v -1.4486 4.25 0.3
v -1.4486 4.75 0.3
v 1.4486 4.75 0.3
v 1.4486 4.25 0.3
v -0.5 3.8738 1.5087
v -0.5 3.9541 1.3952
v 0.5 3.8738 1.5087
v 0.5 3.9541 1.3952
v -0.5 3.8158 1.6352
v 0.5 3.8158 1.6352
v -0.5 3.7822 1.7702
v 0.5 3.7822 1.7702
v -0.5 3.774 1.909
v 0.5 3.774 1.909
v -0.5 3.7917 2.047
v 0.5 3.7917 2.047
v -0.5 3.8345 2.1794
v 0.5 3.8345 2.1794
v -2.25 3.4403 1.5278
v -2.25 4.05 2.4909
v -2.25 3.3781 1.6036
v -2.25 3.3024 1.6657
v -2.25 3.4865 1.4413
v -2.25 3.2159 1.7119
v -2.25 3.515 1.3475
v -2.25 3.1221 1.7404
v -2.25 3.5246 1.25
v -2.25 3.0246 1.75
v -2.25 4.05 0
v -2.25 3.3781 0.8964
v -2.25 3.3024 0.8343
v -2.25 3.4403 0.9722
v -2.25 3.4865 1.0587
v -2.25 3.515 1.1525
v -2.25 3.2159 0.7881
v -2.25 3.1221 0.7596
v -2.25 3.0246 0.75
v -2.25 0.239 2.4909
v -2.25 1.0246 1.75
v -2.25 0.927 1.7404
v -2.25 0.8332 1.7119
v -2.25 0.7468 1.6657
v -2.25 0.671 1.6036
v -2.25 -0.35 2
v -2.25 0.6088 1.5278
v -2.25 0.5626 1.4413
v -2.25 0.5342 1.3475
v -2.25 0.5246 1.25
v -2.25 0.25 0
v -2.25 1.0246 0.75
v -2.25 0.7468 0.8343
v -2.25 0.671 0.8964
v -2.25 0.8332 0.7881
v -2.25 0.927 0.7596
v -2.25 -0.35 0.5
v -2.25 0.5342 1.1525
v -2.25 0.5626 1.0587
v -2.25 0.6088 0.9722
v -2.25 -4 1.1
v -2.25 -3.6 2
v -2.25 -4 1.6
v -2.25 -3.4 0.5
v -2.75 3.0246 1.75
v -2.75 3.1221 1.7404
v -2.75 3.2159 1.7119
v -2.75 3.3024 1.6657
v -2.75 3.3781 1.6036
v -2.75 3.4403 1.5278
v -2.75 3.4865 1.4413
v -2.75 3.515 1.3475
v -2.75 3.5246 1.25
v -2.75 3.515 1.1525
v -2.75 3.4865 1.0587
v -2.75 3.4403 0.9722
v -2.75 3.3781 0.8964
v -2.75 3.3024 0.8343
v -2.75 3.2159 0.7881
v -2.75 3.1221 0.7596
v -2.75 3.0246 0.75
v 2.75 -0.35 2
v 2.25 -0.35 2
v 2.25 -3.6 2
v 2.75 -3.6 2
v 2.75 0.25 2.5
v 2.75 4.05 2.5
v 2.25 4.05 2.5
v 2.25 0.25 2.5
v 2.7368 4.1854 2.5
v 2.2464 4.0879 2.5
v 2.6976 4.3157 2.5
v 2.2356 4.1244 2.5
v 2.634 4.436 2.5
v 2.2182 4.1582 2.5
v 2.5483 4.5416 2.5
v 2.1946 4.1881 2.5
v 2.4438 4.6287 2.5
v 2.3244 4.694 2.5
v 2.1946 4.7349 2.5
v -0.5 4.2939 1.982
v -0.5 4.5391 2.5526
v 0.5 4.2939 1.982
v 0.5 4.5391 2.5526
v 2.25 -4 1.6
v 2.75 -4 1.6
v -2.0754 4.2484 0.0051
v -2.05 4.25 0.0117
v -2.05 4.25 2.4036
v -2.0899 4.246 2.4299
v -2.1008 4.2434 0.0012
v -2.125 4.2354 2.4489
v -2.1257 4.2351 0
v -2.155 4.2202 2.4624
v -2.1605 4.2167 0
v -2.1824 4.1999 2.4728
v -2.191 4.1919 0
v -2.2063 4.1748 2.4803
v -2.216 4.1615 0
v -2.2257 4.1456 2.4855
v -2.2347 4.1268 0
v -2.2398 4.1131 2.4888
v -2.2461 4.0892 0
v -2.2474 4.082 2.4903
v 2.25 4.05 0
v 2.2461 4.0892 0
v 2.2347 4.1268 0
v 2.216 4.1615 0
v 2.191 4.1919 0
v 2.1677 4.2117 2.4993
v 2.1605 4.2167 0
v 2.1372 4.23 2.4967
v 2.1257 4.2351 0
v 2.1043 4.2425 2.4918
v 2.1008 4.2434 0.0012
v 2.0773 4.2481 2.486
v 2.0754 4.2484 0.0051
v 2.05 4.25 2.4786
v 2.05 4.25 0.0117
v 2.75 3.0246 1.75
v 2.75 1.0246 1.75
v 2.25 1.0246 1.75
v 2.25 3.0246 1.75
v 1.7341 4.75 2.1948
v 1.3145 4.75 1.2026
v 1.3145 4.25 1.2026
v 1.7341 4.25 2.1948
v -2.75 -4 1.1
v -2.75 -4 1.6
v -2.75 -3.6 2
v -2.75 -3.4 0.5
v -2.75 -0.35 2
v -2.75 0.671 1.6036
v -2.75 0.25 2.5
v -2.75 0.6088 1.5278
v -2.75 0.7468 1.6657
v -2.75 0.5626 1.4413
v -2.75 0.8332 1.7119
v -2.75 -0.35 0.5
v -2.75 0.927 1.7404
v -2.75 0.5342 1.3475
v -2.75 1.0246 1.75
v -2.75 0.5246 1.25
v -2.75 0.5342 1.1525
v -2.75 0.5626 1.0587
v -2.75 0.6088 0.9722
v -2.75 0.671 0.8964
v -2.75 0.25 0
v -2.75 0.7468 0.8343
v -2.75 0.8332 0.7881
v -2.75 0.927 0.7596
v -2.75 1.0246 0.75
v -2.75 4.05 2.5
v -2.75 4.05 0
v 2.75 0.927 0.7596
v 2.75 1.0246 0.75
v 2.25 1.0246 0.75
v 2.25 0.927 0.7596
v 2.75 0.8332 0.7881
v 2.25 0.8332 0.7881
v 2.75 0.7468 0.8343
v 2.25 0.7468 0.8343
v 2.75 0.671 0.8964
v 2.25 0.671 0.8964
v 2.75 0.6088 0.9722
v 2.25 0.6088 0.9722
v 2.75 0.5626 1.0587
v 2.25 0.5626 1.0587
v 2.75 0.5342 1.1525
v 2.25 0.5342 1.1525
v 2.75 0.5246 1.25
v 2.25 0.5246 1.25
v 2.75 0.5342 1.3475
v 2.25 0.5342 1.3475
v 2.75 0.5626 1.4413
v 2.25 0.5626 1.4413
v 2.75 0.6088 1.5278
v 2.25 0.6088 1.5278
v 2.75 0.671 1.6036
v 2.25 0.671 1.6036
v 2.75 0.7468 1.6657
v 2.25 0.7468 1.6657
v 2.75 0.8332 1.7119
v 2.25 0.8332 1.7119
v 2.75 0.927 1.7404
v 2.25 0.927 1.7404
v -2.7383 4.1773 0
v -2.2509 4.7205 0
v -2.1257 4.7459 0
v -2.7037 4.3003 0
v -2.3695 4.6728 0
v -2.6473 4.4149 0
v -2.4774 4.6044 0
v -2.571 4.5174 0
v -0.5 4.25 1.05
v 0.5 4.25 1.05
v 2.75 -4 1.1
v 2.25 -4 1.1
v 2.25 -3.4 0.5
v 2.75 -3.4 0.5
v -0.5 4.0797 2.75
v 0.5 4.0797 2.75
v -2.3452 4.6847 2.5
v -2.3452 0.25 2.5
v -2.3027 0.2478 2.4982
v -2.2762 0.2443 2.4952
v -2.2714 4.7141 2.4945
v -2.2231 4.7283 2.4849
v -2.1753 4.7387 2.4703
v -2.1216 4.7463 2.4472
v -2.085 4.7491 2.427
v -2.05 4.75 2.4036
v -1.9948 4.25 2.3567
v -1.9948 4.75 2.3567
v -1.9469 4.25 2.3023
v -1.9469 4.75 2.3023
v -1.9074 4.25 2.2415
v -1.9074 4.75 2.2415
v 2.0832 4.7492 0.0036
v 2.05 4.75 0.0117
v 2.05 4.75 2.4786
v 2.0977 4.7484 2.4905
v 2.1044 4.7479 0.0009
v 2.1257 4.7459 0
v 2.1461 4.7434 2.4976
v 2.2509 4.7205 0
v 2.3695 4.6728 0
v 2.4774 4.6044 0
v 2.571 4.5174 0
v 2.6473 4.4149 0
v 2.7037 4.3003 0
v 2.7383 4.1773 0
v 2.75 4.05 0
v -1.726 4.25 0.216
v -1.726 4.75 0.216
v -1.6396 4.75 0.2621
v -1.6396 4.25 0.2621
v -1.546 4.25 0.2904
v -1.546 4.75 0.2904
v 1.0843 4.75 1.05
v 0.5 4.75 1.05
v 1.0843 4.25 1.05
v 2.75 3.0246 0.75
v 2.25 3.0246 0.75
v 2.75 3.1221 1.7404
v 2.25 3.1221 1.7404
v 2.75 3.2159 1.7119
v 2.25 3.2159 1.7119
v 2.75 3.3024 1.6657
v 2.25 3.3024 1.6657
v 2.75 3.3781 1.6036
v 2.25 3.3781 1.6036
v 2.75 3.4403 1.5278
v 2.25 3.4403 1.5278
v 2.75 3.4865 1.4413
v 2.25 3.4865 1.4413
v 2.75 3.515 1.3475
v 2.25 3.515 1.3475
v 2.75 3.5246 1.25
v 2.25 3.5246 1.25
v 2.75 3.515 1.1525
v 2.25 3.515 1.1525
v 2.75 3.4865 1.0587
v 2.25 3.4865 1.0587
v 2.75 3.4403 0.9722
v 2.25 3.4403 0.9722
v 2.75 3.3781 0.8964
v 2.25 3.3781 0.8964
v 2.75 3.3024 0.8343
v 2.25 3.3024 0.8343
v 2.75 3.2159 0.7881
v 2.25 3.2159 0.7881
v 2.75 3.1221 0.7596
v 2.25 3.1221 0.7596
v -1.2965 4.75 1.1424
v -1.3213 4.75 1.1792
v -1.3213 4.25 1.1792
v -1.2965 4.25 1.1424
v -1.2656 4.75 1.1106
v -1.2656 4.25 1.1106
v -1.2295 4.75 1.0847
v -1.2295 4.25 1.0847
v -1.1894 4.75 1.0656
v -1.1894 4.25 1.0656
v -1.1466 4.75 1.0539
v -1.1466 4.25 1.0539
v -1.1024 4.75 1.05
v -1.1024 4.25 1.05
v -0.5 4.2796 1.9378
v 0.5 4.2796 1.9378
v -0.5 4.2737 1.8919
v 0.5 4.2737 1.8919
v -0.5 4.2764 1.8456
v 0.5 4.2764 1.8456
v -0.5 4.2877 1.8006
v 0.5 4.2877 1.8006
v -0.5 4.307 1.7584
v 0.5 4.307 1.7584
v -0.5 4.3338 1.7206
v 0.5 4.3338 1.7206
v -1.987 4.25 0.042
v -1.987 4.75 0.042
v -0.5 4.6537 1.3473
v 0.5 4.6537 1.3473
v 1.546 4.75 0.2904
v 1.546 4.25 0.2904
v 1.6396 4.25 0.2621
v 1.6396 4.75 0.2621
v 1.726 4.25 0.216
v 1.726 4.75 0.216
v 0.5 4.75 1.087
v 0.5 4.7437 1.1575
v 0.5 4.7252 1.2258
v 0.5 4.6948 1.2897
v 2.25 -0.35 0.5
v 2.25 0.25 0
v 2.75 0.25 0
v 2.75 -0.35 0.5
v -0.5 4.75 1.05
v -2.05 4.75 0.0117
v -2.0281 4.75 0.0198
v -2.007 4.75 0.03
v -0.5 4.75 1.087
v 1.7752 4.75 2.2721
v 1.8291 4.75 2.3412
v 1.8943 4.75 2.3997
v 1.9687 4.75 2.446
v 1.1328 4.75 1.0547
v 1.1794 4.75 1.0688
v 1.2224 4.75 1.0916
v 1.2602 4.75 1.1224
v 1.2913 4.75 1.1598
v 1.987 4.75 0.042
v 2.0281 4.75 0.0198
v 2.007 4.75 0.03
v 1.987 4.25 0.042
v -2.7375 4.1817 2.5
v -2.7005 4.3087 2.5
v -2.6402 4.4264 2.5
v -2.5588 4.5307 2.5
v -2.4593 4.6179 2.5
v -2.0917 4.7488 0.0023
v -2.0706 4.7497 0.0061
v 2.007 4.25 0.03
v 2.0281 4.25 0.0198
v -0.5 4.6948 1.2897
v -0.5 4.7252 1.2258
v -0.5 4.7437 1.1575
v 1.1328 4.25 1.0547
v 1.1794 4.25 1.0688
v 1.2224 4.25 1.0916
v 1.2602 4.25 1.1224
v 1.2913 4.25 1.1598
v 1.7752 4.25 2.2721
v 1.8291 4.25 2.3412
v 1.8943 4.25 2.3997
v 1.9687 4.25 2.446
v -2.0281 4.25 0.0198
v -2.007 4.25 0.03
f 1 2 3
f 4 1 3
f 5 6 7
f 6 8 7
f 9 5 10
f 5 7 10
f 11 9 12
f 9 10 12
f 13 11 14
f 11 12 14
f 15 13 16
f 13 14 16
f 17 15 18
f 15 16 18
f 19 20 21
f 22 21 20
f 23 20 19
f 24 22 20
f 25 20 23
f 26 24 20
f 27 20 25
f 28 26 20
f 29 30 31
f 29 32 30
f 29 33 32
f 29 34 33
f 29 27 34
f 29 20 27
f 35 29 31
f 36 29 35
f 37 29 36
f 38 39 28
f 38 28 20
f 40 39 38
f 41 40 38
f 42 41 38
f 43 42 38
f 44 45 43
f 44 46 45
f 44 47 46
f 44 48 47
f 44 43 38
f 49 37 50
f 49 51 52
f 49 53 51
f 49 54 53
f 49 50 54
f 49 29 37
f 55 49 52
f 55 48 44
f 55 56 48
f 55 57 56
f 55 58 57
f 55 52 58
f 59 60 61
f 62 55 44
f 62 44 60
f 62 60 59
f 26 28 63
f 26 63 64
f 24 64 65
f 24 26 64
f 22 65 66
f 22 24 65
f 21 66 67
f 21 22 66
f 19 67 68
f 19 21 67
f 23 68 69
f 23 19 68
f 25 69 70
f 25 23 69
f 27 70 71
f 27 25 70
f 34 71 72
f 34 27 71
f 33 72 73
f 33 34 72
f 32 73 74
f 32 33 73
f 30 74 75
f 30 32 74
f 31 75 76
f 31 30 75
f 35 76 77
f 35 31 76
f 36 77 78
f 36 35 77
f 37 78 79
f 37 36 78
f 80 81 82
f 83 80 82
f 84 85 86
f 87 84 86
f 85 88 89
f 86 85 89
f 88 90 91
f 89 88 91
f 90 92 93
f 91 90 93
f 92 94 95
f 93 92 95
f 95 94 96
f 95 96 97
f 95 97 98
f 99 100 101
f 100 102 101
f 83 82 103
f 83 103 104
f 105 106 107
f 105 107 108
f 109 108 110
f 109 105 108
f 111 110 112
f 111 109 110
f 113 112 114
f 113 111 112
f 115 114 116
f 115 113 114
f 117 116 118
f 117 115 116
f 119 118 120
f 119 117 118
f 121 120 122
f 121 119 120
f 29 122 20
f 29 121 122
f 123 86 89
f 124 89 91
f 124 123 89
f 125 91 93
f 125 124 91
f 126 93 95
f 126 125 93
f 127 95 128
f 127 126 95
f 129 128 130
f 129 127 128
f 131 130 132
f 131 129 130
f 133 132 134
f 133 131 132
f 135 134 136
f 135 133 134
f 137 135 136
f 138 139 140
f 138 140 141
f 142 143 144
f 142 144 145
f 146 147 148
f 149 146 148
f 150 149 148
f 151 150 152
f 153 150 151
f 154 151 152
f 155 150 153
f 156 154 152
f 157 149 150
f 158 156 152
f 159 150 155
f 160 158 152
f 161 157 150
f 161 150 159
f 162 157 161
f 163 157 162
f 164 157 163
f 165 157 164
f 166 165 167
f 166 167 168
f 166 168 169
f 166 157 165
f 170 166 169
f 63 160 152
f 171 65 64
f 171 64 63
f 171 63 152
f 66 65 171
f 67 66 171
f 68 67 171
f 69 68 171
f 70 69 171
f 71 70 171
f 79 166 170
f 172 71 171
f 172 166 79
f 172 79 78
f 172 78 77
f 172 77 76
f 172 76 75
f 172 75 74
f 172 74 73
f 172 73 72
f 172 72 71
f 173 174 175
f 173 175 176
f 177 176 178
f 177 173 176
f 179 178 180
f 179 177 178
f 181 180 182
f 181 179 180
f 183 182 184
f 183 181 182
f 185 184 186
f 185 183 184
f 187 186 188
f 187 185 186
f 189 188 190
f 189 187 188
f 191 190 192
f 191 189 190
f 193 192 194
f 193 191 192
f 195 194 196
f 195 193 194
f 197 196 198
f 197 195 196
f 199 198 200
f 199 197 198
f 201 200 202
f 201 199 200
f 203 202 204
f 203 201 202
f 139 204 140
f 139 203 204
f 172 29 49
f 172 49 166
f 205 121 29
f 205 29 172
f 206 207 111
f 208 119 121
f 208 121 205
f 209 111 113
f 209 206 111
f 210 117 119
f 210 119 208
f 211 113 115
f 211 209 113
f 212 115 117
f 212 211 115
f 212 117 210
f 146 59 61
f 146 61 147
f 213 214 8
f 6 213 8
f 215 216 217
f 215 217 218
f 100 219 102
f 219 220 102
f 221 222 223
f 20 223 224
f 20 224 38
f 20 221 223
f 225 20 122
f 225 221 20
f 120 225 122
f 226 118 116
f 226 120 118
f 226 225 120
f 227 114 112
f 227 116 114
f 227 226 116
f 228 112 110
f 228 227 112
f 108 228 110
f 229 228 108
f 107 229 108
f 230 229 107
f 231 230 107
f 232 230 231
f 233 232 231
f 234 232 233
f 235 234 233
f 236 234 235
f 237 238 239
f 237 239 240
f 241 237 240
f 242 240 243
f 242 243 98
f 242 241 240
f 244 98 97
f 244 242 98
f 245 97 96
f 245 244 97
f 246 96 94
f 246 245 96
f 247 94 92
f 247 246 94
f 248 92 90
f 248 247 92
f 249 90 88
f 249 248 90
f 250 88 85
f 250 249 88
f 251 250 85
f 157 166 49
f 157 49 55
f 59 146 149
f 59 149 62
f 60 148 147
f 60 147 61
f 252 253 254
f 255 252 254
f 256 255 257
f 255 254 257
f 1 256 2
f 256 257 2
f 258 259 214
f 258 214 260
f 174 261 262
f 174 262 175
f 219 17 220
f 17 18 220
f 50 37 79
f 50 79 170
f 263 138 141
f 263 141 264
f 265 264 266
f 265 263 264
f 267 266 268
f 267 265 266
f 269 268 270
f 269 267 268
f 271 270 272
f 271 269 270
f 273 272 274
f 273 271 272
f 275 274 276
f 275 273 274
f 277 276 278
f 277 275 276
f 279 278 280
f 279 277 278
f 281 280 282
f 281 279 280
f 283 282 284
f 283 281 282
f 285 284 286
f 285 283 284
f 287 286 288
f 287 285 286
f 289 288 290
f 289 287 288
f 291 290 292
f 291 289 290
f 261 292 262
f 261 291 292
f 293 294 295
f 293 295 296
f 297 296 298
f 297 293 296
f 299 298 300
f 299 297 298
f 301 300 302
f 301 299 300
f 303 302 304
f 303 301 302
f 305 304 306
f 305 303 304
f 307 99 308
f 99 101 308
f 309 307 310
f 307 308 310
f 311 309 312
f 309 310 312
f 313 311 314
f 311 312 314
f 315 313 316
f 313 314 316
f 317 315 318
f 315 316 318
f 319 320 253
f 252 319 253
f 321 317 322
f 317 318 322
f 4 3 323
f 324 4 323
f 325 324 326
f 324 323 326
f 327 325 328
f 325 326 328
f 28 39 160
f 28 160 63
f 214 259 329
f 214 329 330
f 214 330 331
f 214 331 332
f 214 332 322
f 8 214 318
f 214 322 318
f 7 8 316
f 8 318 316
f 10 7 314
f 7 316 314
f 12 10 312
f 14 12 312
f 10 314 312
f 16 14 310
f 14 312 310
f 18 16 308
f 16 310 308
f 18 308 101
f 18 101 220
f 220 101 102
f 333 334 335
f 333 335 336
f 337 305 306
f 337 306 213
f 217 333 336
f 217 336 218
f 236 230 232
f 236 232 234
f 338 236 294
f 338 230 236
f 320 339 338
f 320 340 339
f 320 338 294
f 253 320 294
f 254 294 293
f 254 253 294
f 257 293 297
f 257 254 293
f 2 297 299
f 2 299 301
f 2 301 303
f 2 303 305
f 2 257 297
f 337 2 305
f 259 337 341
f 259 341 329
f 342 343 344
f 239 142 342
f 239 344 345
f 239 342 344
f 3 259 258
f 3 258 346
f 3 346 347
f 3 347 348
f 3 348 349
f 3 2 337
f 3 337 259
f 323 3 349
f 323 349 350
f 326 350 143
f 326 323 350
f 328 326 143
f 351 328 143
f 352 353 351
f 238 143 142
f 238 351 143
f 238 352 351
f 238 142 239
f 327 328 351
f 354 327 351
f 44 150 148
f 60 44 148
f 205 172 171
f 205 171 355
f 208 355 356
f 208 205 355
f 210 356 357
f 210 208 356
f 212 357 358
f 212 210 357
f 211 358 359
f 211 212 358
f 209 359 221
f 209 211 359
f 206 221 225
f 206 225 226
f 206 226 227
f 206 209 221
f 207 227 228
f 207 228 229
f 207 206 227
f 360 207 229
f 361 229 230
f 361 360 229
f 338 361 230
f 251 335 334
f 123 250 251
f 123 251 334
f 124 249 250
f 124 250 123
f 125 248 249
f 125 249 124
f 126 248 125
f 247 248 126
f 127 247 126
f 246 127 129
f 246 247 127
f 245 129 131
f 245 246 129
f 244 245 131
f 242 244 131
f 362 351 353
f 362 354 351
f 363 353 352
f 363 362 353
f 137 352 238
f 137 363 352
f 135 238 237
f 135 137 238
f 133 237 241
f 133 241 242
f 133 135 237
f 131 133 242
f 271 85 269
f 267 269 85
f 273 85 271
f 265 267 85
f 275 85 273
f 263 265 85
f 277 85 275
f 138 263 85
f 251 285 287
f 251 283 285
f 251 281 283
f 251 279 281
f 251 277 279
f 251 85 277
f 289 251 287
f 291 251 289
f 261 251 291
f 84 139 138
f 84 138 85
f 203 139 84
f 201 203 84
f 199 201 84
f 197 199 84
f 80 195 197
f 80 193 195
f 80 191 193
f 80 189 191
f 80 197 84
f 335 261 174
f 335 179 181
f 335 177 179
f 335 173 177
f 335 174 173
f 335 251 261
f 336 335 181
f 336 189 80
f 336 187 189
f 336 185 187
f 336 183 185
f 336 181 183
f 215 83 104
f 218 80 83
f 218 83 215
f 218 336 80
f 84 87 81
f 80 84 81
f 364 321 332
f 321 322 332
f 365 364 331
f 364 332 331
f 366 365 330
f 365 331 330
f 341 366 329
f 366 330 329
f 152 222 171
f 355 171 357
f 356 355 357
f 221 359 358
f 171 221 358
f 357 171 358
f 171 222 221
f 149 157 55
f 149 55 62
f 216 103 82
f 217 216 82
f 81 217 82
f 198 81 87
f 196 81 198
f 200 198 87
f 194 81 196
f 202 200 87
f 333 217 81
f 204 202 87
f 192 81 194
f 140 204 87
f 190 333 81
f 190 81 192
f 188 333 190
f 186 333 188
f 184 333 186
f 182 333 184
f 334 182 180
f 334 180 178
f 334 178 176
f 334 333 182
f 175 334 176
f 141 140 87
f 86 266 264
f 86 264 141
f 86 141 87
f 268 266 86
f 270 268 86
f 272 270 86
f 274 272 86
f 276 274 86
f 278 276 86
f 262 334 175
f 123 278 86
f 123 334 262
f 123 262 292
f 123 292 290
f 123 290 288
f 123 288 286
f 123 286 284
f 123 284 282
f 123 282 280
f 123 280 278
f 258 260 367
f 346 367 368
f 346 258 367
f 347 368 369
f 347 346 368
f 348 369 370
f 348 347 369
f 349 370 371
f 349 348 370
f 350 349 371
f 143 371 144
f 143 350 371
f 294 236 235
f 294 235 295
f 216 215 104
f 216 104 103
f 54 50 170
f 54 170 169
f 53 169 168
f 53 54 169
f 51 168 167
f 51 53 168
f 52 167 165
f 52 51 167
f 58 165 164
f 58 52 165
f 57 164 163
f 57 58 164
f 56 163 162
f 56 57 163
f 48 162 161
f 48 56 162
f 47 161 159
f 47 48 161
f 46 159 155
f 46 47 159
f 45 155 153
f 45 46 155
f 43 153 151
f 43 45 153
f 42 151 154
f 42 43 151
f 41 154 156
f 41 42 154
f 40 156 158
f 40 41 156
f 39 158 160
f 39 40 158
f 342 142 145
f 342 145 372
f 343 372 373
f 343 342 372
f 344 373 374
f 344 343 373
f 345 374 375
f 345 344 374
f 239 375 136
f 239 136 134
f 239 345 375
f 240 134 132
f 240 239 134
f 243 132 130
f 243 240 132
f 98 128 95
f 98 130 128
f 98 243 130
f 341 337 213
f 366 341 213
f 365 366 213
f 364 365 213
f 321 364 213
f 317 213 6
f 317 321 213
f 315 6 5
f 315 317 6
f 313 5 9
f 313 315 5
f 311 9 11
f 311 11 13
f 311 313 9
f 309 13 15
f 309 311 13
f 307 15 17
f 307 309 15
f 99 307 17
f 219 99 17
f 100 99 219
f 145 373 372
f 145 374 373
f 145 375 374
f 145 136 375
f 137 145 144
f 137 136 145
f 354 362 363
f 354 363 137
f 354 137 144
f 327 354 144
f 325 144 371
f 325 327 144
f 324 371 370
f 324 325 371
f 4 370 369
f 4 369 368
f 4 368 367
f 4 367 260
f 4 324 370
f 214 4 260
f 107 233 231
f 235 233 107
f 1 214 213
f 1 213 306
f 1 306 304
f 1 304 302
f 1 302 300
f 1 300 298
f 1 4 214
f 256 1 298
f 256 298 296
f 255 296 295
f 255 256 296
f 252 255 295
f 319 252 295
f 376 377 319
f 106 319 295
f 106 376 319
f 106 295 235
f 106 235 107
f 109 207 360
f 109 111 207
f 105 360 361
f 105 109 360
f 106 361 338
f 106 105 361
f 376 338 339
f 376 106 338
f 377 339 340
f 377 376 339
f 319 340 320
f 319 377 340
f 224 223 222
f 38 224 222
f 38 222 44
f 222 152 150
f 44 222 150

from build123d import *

# Parameters (mm, degrees)
BOSS_EXTRUDE1_DEPTH = 2.5
CUT_EXTRUDE1_DEPTH  = 10.5
FILLET1_R           = 0.25
CUT_EXTRUDE2_DEPTH  = 5.25
BOSS_EXTRUDE2_DEPTH = 0.5
CHAMFER1_SIZE       = 0.6
CHAMFER2_SIZE       = 0.4


with BuildPart() as part:
    # Sketch1 → Boss-Extrude1 (new body)
    with BuildSketch(Plane.XY):
        with BuildLine():
            Line((-2.75, -4), (-2.75, 4.05))
            ThreePointArc((-2.75, 4.05), (-2.544974747, 4.544974747), (-2.05, 4.75))
            Line((-2.05, 4.75), (2.05, 4.75))
            ThreePointArc((2.05, 4.75), (2.544974747, 4.544974747), (2.75, 4.05))
            Line((2.75, 4.05), (2.75, -4))
            Line((2.75, -4), (2.25, -4))
            Line((2.25, -4), (2.25, 4.05))
            ThreePointArc((2.25, 4.05), (2.191421356, 4.191421356), (2.05, 4.25))
            Line((2.05, 4.25), (-2.05, 4.25))
            ThreePointArc((-2.05, 4.25), (-2.191421356, 4.191421356), (-2.25, 4.05))
            Line((-2.25, 4.05), (-2.25, -4))
            Line((-2.25, -4), (-2.75, -4))
        make_face()
    extrude(amount=BOSS_EXTRUDE1_DEPTH)

    # Sketch2 → Cut-Extrude1 (cut)
    with BuildSketch(Plane(origin=(0, 4.75, 0), x_dir=(1, 0, 0), z_dir=(0, 1, 0))):
        with BuildLine():
            Line((-2.05, 0), (-1.725962279, -0.216025147))
            ThreePointArc((-1.725962279, -0.216025147), (-1.593504255, -0.278546013), (-1.448612181, -0.3))
            Line((-1.448612181, -0.3), (1.448612181, -0.3))
            ThreePointArc((1.448612181, -0.3), (1.593504255, -0.278546013), (1.725962279, -0.216025147))
            Line((1.725962279, -0.216025147), (2.05, 0))
            Line((2.05, 0), (2.05, 0.547519398))
            Line((2.05, 0.547519398), (-2.05, 0.547519398))
            Line((-2.05, 0.547519398), (-2.05, 0))
        make_face()
        with BuildLine():
            Line((-2.75, -2.5), (-2.345189488, -2.5))
            ThreePointArc((-2.345189488, -2.5), (-2.090994028, -2.430563198), (-1.907400646, -2.241538671))
            Line((-1.907400646, -2.241538671), (-1.321299677, -1.179230664))
            ThreePointArc((-1.321299677, -1.179230664), (-1.229502986, -1.084718401), (-1.102405256, -1.05))
            Line((-1.102405256, -1.05), (1.084290526, -1.05))
            ThreePointArc((1.084290526, -1.05), (1.222412736, -1.091619926), (1.314545856, -1.202621958))
            Line((1.314545856, -1.202621958), (1.734132573, -2.194756083))
            ThreePointArc((1.734132573, -2.194756083), (1.918398814, -2.416760148), (2.194643233, -2.5))
            Line((2.194643233, -2.5), (2.75, -2.5))
            Line((2.75, -2.5), (2.75, -3.056093585))
            Line((2.75, -3.056093585), (-2.75, -3.056093585))
            Line((-2.75, -3.056093585), (-2.75, -2.5))
        make_face()
    extrude(amount=-CUT_EXTRUDE1_DEPTH, mode=Mode.SUBTRACT)

    # Fillet1
    fillet1_edges = [part.edges().sort_by_distance(p)[0] for p in [
        (-2.05, 4.5, 0),
        (2.05, 4.5, 0),
    ]]
    fillet(fillet1_edges, radius=FILLET1_R)

    # Sketch3 → Cut-Extrude2 (cut, symmetric)
    with BuildSketch(Plane(origin=(0, 0, 0), x_dir=(0, 0, -1), z_dir=(1, 0, 0))):
        Polygon((0, 0.25), (-0.5, -0.35), (-0.5, -4.396314828), (0.876390697, -4.396314828), (0.876390697, 0.25), align=None)
        Polygon((-2.5, 0.25), (-2, -0.35), (-2, -4.896314828), (-3.070294312, -4.896314828), (-3.070294312, 0.25), align=None)
        with BuildLine():
            Line((-0.75, 3.024565065), (-0.75, 1.024565065))
            ThreePointArc((-0.75, 1.024565065), (-1.25, 0.524565065), (-1.75, 1.024565065))
            Line((-1.75, 1.024565065), (-1.75, 3.024565065))
            ThreePointArc((-1.75, 3.024565065), (-1.25, 3.524565065), (-0.75, 3.024565065))
        make_face()
    extrude(amount=CUT_EXTRUDE2_DEPTH, both=True, mode=Mode.SUBTRACT)

    # Sketch4 → Boss-Extrude2 (add, symmetric)
    with BuildSketch(Plane(origin=(0, 0, 0), x_dir=(0, 0, -1), z_dir=(1, 0, 0))):
        with BuildLine():
            Line((-1.05, 4.25), (-1.395169213, 3.954140675))
            ThreePointArc((-1.395169213, 3.954140675), (-1.770160684, 3.782160221), (-2.179373497, 3.834512432))
            Line((-2.179373497, 3.834512432), (-2.75, 4.079724782))
            Line((-2.75, 4.079724782), (-2.552592831, 4.539105245))
            Line((-2.552592831, 4.539105245), (-1.981966328, 4.293892895))
            ThreePointArc((-1.981966328, 4.293892895), (-1.845562057, 4.276442158), (-1.7205649, 4.333768976))
            Line((-1.7205649, 4.333768976), (-1.347308957, 4.653702641))
            ThreePointArc((-1.347308957, 4.653702641), (-1.225770907, 4.725154006), (-1.086992408, 4.75))
            Line((-1.086992408, 4.75), (-1.05, 4.75))
            Line((-1.05, 4.75), (-1.05, 4.25))
        make_face()
    extrude(amount=BOSS_EXTRUDE2_DEPTH, both=True)

    # Chamfer1
    chamfer1_edges = [part.edges().sort_by_distance(p)[0] for p in [
        (2.5, -4, 0.5),
        (-2.5, -4, 0.5),
    ]]
    chamfer(chamfer1_edges, length=CHAMFER1_SIZE)

    # Chamfer2
    chamfer2_edges = [part.edges().sort_by_distance(p)[0] for p in [
        (2.5, -4, 2),
        (-2.5, -4, 2),
    ]]
    chamfer(chamfer2_edges, length=CHAMFER2_SIZE)


solid = part.part
